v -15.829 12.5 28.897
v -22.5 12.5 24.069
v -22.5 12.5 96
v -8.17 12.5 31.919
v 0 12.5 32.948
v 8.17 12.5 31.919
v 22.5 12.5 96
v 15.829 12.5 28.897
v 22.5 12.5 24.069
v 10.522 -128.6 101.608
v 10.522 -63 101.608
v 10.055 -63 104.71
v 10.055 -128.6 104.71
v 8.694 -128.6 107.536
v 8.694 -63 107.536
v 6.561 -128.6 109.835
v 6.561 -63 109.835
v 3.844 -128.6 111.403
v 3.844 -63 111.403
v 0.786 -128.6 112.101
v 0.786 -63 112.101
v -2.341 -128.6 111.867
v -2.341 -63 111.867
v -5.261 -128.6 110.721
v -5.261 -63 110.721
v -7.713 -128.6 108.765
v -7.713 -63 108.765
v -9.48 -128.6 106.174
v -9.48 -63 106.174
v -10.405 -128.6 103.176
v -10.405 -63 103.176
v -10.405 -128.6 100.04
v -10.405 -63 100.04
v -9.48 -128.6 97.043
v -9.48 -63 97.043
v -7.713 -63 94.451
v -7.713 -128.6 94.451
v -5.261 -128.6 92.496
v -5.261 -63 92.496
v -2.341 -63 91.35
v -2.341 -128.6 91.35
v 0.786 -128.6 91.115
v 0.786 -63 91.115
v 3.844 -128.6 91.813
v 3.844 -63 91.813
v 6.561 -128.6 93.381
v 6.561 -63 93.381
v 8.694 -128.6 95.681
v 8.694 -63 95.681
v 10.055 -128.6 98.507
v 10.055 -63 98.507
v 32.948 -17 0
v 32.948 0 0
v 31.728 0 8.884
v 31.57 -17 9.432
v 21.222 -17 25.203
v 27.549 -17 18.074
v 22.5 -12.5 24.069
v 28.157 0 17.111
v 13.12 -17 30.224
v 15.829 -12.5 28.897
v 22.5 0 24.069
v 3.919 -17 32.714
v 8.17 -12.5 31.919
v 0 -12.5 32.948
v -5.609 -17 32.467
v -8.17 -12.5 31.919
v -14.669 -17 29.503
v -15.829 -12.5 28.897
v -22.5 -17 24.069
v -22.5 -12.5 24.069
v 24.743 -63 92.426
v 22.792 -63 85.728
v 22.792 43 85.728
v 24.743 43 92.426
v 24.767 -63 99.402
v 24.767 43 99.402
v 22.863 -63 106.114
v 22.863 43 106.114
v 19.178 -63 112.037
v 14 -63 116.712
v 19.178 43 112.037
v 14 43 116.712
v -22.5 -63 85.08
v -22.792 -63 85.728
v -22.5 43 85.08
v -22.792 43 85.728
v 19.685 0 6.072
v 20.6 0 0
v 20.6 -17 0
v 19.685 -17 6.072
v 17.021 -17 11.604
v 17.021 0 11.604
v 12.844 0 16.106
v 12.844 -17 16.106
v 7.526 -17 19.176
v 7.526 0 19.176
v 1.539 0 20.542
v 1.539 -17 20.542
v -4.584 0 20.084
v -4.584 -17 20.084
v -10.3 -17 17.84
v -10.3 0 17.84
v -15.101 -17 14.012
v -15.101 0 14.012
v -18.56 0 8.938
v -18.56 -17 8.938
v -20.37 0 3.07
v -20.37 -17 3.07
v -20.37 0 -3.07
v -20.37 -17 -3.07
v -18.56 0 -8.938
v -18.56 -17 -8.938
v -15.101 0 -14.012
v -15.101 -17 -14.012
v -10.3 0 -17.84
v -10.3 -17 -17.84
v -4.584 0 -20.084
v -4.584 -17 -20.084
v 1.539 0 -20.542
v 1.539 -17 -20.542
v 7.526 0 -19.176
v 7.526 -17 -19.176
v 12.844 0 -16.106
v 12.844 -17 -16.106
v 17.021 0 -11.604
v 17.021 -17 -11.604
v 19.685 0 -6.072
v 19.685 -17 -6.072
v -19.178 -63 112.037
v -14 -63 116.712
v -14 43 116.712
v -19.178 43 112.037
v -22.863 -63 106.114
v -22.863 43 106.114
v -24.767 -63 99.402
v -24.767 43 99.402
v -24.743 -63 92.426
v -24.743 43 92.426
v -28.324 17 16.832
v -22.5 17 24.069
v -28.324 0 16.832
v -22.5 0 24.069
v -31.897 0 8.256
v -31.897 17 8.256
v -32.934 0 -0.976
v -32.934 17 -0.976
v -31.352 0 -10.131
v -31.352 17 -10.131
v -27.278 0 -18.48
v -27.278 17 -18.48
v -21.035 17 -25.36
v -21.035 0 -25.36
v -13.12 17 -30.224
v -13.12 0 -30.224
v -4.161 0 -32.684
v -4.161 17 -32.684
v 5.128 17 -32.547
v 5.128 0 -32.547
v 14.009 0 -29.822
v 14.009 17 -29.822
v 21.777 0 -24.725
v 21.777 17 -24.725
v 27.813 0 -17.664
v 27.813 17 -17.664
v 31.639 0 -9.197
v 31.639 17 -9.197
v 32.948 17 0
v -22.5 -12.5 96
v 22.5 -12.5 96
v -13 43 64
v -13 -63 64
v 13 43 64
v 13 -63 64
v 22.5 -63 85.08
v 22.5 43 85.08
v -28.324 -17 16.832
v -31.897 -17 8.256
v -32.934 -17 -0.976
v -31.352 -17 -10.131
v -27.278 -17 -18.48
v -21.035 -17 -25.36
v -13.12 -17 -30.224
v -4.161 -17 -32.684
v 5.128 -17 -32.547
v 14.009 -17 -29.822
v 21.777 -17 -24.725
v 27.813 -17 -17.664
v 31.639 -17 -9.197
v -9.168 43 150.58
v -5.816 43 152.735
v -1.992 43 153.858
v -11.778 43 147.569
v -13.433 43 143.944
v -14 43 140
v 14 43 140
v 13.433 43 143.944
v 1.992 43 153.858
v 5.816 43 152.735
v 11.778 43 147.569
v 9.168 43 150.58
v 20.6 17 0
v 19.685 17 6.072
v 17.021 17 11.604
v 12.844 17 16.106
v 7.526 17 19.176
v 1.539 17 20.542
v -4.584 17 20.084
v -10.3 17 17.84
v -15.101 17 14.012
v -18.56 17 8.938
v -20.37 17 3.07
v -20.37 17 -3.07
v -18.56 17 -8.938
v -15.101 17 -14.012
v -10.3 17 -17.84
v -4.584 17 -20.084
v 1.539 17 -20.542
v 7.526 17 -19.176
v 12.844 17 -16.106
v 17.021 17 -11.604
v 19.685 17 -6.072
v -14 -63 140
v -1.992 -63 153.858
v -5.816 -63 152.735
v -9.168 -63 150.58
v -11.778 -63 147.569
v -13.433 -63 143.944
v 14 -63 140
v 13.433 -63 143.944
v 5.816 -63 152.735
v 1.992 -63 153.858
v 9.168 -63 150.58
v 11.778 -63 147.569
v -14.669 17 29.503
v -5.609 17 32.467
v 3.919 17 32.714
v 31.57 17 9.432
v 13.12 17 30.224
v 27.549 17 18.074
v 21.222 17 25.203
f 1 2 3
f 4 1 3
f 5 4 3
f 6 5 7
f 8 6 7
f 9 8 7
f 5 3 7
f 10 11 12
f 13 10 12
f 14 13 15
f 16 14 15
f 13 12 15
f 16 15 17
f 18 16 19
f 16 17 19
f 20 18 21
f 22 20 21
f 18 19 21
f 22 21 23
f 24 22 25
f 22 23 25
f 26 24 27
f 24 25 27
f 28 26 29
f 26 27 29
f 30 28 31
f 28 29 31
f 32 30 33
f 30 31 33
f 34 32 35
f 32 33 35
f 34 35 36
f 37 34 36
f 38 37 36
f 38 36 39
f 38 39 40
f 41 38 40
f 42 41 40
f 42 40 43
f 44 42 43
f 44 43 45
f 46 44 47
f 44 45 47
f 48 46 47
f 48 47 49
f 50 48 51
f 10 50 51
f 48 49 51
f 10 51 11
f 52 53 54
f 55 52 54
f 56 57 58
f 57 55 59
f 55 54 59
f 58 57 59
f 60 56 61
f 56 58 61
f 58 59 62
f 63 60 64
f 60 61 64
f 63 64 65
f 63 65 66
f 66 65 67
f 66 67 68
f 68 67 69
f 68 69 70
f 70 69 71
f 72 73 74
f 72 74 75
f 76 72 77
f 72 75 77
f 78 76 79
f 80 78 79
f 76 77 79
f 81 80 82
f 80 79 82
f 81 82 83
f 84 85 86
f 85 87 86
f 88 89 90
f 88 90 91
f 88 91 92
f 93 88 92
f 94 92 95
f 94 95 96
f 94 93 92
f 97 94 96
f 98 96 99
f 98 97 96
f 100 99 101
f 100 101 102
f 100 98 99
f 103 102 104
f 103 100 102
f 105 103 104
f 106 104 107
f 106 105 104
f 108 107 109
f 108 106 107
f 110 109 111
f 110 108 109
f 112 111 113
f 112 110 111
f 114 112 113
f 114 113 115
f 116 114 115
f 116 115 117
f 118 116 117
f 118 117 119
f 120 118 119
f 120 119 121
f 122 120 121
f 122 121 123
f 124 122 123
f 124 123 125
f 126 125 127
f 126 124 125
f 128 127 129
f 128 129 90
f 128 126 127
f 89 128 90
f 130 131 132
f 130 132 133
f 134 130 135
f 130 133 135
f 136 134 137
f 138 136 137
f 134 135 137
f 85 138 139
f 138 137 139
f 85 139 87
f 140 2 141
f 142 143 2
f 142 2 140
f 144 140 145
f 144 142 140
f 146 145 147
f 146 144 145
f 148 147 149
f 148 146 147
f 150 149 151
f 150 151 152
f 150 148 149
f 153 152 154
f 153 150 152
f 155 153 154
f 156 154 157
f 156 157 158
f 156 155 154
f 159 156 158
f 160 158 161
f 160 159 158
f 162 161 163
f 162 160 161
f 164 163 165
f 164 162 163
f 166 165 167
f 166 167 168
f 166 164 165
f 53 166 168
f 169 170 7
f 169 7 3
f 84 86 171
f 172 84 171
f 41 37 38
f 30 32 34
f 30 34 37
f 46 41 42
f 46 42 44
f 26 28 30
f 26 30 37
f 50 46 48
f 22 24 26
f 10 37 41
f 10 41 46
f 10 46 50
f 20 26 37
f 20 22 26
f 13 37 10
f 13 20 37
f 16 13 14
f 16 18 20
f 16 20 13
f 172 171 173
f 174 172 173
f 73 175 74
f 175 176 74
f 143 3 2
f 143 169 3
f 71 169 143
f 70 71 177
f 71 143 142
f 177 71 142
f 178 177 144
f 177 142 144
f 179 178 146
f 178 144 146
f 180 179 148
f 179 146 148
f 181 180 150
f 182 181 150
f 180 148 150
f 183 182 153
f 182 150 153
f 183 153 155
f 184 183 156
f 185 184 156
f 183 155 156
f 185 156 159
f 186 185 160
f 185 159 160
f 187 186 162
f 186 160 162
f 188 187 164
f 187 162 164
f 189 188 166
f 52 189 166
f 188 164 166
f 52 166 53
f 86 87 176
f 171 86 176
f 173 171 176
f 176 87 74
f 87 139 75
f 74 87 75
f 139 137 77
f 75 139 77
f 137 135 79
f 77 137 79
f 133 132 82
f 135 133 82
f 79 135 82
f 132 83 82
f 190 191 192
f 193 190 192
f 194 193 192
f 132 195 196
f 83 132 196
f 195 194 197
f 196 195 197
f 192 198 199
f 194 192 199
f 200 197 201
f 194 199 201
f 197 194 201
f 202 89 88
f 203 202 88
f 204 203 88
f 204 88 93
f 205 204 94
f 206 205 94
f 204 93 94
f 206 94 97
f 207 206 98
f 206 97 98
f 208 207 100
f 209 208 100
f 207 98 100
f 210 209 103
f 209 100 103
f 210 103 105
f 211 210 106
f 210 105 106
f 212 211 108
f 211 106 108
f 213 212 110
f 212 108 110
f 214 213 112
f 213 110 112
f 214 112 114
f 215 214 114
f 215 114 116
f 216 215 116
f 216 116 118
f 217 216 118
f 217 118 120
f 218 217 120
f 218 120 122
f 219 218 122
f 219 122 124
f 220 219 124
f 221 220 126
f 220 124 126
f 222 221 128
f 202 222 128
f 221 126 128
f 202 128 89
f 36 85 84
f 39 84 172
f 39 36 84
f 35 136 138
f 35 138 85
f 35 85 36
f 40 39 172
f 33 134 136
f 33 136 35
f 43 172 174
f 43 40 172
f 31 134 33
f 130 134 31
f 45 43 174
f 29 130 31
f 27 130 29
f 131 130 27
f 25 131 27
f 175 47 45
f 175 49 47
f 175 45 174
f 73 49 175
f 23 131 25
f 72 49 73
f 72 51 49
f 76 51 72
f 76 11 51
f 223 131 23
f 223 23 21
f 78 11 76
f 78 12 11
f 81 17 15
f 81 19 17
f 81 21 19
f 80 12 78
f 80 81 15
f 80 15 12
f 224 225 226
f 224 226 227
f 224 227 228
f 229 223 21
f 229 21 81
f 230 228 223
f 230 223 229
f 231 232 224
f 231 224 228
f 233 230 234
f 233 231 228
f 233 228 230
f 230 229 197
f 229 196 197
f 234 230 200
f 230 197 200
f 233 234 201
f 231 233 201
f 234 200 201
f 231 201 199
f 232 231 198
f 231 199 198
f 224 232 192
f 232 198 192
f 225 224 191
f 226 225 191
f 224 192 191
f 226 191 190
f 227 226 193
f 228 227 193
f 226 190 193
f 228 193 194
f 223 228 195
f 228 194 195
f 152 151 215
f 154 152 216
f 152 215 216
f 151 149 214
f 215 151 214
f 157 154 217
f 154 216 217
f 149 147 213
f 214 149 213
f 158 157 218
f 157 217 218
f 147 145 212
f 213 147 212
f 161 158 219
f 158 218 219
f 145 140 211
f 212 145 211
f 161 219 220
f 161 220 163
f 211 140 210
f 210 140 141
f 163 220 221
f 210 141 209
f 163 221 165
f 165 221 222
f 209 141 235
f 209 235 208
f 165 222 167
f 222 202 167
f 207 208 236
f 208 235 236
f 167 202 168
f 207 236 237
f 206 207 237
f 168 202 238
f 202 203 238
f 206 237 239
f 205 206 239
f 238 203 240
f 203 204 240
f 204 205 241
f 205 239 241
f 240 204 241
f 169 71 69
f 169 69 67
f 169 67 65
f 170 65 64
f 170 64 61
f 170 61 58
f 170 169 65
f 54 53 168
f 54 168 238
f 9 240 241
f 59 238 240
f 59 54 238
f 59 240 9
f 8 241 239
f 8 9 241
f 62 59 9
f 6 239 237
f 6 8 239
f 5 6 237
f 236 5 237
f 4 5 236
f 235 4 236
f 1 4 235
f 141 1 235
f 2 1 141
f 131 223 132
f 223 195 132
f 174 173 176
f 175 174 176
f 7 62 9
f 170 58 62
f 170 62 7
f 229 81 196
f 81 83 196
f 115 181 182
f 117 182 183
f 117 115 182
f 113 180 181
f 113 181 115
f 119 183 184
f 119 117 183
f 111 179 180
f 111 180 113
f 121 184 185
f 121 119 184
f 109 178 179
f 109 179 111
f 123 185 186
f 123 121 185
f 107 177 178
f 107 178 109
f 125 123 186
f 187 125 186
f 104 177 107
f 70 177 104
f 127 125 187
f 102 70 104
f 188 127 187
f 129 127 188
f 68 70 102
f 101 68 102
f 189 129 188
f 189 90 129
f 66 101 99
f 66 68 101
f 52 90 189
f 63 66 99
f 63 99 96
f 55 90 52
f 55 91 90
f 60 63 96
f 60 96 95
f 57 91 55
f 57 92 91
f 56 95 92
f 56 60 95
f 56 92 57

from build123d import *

# Parameters (mm, degrees)
F0_R     = 20.6
F1_DEPTH = 17
F2_DEPTH = 12.5
F4_DEPTH = 43
F5_DEPTH = 20
F6_R     = 10.5222684304
F7_DEPTH = 65.6


# Not quite as in the source:
# - a feature names something its author has since deleted; it is built from what else it names


with BuildPart() as f1:
    # F0 (on Front) → F1 (new body, symmetric)
    with BuildSketch(Plane.XZ):
        with BuildLine():
            ThreePointArc((-22.5, 24.0694217363), (-13.1196699102, -30.2235226962), (32.9482482496, 0))
            ThreePointArc((32.9482482496, 0), (30.2235226962, 13.1196699102), (22.5, 24.0694217363))
            ThreePointArc((22.5, 24.0694217363), (0, 32.9482482496), (-22.5, 24.0694217363))
        make_face()
        Circle(F0_R, mode=Mode.SUBTRACT)
    extrude(amount=F1_DEPTH, both=True)

    # F0 (on Front) → F2 (join, symmetric)
    with BuildSketch(Plane.XZ):
        with BuildLine():
            ThreePointArc((-22.5, 24.0694217363), (0, 32.9482482496), (22.5, 24.0694217363))
            Line((22.5, 24.0694217363), (22.5, 85.0795575915))
            Line((22.5, 85.0795575915), (13, 64))
            Line((13, 64), (-13, 64))
            Line((-13, 64), (-22.5, 85.0795575915))
            Line((-22.5, 85.0795575915), (-22.5, 24.0694217363))
        make_face()
        Polygon((13, 64), (22.5, 85.0795575915), (22.5, 96), (-22.5, 96), (-22.5, 85.0795575915), (-13, 64), align=None)
    extrude(amount=F2_DEPTH, both=True)


with BuildPart() as f4:
    # F3 (on Front) → F4 (new body, symmetric)
    with BuildSketch(Plane.XZ):
        with BuildLine():
            Line((13, 64), (22.5, 85.0795575915))
            Line((22.5, 85.0795575915), (22.7922887347, 85.7281172985))
            ThreePointArc((22.7922887347, 85.7281172985), (24.0504315373, 102.8247155888), (14, 116.7123151772))
            Line((14, 116.7123151772), (14, 140))
            ThreePointArc((14, 140), (0, 154), (-14, 140))
            Line((-14, 140), (-14, 116.7123151772))
            ThreePointArc((-14, 116.7123151772), (-24.0504315373, 102.8247155888), (-22.7922887347, 85.7281172985))
            Line((-22.7922887347, 85.7281172985), (-22.5, 85.0795575915))
            Line((-22.5, 85.0795575915), (-13, 64))
            Line((-13, 64), (13, 64))
        make_face()
    extrude(amount=F4_DEPTH, both=True)

    # F5 (add): a face of the model
    f5_faces = [f4.faces().sort_by_distance(p)[0] for p in [
        (0, -43, 104.5669509918),
    ]]
    extrude(f5_faces, amount=F5_DEPTH)

    # F6 (on face) → F7 (join)
    with BuildSketch(Plane.XZ.offset(63)):
        with Locations((0, 101.6081124544)):
            Circle(F6_R)
    extrude(amount=F7_DEPTH)


solid = Compound([f1.part, f4.part])
